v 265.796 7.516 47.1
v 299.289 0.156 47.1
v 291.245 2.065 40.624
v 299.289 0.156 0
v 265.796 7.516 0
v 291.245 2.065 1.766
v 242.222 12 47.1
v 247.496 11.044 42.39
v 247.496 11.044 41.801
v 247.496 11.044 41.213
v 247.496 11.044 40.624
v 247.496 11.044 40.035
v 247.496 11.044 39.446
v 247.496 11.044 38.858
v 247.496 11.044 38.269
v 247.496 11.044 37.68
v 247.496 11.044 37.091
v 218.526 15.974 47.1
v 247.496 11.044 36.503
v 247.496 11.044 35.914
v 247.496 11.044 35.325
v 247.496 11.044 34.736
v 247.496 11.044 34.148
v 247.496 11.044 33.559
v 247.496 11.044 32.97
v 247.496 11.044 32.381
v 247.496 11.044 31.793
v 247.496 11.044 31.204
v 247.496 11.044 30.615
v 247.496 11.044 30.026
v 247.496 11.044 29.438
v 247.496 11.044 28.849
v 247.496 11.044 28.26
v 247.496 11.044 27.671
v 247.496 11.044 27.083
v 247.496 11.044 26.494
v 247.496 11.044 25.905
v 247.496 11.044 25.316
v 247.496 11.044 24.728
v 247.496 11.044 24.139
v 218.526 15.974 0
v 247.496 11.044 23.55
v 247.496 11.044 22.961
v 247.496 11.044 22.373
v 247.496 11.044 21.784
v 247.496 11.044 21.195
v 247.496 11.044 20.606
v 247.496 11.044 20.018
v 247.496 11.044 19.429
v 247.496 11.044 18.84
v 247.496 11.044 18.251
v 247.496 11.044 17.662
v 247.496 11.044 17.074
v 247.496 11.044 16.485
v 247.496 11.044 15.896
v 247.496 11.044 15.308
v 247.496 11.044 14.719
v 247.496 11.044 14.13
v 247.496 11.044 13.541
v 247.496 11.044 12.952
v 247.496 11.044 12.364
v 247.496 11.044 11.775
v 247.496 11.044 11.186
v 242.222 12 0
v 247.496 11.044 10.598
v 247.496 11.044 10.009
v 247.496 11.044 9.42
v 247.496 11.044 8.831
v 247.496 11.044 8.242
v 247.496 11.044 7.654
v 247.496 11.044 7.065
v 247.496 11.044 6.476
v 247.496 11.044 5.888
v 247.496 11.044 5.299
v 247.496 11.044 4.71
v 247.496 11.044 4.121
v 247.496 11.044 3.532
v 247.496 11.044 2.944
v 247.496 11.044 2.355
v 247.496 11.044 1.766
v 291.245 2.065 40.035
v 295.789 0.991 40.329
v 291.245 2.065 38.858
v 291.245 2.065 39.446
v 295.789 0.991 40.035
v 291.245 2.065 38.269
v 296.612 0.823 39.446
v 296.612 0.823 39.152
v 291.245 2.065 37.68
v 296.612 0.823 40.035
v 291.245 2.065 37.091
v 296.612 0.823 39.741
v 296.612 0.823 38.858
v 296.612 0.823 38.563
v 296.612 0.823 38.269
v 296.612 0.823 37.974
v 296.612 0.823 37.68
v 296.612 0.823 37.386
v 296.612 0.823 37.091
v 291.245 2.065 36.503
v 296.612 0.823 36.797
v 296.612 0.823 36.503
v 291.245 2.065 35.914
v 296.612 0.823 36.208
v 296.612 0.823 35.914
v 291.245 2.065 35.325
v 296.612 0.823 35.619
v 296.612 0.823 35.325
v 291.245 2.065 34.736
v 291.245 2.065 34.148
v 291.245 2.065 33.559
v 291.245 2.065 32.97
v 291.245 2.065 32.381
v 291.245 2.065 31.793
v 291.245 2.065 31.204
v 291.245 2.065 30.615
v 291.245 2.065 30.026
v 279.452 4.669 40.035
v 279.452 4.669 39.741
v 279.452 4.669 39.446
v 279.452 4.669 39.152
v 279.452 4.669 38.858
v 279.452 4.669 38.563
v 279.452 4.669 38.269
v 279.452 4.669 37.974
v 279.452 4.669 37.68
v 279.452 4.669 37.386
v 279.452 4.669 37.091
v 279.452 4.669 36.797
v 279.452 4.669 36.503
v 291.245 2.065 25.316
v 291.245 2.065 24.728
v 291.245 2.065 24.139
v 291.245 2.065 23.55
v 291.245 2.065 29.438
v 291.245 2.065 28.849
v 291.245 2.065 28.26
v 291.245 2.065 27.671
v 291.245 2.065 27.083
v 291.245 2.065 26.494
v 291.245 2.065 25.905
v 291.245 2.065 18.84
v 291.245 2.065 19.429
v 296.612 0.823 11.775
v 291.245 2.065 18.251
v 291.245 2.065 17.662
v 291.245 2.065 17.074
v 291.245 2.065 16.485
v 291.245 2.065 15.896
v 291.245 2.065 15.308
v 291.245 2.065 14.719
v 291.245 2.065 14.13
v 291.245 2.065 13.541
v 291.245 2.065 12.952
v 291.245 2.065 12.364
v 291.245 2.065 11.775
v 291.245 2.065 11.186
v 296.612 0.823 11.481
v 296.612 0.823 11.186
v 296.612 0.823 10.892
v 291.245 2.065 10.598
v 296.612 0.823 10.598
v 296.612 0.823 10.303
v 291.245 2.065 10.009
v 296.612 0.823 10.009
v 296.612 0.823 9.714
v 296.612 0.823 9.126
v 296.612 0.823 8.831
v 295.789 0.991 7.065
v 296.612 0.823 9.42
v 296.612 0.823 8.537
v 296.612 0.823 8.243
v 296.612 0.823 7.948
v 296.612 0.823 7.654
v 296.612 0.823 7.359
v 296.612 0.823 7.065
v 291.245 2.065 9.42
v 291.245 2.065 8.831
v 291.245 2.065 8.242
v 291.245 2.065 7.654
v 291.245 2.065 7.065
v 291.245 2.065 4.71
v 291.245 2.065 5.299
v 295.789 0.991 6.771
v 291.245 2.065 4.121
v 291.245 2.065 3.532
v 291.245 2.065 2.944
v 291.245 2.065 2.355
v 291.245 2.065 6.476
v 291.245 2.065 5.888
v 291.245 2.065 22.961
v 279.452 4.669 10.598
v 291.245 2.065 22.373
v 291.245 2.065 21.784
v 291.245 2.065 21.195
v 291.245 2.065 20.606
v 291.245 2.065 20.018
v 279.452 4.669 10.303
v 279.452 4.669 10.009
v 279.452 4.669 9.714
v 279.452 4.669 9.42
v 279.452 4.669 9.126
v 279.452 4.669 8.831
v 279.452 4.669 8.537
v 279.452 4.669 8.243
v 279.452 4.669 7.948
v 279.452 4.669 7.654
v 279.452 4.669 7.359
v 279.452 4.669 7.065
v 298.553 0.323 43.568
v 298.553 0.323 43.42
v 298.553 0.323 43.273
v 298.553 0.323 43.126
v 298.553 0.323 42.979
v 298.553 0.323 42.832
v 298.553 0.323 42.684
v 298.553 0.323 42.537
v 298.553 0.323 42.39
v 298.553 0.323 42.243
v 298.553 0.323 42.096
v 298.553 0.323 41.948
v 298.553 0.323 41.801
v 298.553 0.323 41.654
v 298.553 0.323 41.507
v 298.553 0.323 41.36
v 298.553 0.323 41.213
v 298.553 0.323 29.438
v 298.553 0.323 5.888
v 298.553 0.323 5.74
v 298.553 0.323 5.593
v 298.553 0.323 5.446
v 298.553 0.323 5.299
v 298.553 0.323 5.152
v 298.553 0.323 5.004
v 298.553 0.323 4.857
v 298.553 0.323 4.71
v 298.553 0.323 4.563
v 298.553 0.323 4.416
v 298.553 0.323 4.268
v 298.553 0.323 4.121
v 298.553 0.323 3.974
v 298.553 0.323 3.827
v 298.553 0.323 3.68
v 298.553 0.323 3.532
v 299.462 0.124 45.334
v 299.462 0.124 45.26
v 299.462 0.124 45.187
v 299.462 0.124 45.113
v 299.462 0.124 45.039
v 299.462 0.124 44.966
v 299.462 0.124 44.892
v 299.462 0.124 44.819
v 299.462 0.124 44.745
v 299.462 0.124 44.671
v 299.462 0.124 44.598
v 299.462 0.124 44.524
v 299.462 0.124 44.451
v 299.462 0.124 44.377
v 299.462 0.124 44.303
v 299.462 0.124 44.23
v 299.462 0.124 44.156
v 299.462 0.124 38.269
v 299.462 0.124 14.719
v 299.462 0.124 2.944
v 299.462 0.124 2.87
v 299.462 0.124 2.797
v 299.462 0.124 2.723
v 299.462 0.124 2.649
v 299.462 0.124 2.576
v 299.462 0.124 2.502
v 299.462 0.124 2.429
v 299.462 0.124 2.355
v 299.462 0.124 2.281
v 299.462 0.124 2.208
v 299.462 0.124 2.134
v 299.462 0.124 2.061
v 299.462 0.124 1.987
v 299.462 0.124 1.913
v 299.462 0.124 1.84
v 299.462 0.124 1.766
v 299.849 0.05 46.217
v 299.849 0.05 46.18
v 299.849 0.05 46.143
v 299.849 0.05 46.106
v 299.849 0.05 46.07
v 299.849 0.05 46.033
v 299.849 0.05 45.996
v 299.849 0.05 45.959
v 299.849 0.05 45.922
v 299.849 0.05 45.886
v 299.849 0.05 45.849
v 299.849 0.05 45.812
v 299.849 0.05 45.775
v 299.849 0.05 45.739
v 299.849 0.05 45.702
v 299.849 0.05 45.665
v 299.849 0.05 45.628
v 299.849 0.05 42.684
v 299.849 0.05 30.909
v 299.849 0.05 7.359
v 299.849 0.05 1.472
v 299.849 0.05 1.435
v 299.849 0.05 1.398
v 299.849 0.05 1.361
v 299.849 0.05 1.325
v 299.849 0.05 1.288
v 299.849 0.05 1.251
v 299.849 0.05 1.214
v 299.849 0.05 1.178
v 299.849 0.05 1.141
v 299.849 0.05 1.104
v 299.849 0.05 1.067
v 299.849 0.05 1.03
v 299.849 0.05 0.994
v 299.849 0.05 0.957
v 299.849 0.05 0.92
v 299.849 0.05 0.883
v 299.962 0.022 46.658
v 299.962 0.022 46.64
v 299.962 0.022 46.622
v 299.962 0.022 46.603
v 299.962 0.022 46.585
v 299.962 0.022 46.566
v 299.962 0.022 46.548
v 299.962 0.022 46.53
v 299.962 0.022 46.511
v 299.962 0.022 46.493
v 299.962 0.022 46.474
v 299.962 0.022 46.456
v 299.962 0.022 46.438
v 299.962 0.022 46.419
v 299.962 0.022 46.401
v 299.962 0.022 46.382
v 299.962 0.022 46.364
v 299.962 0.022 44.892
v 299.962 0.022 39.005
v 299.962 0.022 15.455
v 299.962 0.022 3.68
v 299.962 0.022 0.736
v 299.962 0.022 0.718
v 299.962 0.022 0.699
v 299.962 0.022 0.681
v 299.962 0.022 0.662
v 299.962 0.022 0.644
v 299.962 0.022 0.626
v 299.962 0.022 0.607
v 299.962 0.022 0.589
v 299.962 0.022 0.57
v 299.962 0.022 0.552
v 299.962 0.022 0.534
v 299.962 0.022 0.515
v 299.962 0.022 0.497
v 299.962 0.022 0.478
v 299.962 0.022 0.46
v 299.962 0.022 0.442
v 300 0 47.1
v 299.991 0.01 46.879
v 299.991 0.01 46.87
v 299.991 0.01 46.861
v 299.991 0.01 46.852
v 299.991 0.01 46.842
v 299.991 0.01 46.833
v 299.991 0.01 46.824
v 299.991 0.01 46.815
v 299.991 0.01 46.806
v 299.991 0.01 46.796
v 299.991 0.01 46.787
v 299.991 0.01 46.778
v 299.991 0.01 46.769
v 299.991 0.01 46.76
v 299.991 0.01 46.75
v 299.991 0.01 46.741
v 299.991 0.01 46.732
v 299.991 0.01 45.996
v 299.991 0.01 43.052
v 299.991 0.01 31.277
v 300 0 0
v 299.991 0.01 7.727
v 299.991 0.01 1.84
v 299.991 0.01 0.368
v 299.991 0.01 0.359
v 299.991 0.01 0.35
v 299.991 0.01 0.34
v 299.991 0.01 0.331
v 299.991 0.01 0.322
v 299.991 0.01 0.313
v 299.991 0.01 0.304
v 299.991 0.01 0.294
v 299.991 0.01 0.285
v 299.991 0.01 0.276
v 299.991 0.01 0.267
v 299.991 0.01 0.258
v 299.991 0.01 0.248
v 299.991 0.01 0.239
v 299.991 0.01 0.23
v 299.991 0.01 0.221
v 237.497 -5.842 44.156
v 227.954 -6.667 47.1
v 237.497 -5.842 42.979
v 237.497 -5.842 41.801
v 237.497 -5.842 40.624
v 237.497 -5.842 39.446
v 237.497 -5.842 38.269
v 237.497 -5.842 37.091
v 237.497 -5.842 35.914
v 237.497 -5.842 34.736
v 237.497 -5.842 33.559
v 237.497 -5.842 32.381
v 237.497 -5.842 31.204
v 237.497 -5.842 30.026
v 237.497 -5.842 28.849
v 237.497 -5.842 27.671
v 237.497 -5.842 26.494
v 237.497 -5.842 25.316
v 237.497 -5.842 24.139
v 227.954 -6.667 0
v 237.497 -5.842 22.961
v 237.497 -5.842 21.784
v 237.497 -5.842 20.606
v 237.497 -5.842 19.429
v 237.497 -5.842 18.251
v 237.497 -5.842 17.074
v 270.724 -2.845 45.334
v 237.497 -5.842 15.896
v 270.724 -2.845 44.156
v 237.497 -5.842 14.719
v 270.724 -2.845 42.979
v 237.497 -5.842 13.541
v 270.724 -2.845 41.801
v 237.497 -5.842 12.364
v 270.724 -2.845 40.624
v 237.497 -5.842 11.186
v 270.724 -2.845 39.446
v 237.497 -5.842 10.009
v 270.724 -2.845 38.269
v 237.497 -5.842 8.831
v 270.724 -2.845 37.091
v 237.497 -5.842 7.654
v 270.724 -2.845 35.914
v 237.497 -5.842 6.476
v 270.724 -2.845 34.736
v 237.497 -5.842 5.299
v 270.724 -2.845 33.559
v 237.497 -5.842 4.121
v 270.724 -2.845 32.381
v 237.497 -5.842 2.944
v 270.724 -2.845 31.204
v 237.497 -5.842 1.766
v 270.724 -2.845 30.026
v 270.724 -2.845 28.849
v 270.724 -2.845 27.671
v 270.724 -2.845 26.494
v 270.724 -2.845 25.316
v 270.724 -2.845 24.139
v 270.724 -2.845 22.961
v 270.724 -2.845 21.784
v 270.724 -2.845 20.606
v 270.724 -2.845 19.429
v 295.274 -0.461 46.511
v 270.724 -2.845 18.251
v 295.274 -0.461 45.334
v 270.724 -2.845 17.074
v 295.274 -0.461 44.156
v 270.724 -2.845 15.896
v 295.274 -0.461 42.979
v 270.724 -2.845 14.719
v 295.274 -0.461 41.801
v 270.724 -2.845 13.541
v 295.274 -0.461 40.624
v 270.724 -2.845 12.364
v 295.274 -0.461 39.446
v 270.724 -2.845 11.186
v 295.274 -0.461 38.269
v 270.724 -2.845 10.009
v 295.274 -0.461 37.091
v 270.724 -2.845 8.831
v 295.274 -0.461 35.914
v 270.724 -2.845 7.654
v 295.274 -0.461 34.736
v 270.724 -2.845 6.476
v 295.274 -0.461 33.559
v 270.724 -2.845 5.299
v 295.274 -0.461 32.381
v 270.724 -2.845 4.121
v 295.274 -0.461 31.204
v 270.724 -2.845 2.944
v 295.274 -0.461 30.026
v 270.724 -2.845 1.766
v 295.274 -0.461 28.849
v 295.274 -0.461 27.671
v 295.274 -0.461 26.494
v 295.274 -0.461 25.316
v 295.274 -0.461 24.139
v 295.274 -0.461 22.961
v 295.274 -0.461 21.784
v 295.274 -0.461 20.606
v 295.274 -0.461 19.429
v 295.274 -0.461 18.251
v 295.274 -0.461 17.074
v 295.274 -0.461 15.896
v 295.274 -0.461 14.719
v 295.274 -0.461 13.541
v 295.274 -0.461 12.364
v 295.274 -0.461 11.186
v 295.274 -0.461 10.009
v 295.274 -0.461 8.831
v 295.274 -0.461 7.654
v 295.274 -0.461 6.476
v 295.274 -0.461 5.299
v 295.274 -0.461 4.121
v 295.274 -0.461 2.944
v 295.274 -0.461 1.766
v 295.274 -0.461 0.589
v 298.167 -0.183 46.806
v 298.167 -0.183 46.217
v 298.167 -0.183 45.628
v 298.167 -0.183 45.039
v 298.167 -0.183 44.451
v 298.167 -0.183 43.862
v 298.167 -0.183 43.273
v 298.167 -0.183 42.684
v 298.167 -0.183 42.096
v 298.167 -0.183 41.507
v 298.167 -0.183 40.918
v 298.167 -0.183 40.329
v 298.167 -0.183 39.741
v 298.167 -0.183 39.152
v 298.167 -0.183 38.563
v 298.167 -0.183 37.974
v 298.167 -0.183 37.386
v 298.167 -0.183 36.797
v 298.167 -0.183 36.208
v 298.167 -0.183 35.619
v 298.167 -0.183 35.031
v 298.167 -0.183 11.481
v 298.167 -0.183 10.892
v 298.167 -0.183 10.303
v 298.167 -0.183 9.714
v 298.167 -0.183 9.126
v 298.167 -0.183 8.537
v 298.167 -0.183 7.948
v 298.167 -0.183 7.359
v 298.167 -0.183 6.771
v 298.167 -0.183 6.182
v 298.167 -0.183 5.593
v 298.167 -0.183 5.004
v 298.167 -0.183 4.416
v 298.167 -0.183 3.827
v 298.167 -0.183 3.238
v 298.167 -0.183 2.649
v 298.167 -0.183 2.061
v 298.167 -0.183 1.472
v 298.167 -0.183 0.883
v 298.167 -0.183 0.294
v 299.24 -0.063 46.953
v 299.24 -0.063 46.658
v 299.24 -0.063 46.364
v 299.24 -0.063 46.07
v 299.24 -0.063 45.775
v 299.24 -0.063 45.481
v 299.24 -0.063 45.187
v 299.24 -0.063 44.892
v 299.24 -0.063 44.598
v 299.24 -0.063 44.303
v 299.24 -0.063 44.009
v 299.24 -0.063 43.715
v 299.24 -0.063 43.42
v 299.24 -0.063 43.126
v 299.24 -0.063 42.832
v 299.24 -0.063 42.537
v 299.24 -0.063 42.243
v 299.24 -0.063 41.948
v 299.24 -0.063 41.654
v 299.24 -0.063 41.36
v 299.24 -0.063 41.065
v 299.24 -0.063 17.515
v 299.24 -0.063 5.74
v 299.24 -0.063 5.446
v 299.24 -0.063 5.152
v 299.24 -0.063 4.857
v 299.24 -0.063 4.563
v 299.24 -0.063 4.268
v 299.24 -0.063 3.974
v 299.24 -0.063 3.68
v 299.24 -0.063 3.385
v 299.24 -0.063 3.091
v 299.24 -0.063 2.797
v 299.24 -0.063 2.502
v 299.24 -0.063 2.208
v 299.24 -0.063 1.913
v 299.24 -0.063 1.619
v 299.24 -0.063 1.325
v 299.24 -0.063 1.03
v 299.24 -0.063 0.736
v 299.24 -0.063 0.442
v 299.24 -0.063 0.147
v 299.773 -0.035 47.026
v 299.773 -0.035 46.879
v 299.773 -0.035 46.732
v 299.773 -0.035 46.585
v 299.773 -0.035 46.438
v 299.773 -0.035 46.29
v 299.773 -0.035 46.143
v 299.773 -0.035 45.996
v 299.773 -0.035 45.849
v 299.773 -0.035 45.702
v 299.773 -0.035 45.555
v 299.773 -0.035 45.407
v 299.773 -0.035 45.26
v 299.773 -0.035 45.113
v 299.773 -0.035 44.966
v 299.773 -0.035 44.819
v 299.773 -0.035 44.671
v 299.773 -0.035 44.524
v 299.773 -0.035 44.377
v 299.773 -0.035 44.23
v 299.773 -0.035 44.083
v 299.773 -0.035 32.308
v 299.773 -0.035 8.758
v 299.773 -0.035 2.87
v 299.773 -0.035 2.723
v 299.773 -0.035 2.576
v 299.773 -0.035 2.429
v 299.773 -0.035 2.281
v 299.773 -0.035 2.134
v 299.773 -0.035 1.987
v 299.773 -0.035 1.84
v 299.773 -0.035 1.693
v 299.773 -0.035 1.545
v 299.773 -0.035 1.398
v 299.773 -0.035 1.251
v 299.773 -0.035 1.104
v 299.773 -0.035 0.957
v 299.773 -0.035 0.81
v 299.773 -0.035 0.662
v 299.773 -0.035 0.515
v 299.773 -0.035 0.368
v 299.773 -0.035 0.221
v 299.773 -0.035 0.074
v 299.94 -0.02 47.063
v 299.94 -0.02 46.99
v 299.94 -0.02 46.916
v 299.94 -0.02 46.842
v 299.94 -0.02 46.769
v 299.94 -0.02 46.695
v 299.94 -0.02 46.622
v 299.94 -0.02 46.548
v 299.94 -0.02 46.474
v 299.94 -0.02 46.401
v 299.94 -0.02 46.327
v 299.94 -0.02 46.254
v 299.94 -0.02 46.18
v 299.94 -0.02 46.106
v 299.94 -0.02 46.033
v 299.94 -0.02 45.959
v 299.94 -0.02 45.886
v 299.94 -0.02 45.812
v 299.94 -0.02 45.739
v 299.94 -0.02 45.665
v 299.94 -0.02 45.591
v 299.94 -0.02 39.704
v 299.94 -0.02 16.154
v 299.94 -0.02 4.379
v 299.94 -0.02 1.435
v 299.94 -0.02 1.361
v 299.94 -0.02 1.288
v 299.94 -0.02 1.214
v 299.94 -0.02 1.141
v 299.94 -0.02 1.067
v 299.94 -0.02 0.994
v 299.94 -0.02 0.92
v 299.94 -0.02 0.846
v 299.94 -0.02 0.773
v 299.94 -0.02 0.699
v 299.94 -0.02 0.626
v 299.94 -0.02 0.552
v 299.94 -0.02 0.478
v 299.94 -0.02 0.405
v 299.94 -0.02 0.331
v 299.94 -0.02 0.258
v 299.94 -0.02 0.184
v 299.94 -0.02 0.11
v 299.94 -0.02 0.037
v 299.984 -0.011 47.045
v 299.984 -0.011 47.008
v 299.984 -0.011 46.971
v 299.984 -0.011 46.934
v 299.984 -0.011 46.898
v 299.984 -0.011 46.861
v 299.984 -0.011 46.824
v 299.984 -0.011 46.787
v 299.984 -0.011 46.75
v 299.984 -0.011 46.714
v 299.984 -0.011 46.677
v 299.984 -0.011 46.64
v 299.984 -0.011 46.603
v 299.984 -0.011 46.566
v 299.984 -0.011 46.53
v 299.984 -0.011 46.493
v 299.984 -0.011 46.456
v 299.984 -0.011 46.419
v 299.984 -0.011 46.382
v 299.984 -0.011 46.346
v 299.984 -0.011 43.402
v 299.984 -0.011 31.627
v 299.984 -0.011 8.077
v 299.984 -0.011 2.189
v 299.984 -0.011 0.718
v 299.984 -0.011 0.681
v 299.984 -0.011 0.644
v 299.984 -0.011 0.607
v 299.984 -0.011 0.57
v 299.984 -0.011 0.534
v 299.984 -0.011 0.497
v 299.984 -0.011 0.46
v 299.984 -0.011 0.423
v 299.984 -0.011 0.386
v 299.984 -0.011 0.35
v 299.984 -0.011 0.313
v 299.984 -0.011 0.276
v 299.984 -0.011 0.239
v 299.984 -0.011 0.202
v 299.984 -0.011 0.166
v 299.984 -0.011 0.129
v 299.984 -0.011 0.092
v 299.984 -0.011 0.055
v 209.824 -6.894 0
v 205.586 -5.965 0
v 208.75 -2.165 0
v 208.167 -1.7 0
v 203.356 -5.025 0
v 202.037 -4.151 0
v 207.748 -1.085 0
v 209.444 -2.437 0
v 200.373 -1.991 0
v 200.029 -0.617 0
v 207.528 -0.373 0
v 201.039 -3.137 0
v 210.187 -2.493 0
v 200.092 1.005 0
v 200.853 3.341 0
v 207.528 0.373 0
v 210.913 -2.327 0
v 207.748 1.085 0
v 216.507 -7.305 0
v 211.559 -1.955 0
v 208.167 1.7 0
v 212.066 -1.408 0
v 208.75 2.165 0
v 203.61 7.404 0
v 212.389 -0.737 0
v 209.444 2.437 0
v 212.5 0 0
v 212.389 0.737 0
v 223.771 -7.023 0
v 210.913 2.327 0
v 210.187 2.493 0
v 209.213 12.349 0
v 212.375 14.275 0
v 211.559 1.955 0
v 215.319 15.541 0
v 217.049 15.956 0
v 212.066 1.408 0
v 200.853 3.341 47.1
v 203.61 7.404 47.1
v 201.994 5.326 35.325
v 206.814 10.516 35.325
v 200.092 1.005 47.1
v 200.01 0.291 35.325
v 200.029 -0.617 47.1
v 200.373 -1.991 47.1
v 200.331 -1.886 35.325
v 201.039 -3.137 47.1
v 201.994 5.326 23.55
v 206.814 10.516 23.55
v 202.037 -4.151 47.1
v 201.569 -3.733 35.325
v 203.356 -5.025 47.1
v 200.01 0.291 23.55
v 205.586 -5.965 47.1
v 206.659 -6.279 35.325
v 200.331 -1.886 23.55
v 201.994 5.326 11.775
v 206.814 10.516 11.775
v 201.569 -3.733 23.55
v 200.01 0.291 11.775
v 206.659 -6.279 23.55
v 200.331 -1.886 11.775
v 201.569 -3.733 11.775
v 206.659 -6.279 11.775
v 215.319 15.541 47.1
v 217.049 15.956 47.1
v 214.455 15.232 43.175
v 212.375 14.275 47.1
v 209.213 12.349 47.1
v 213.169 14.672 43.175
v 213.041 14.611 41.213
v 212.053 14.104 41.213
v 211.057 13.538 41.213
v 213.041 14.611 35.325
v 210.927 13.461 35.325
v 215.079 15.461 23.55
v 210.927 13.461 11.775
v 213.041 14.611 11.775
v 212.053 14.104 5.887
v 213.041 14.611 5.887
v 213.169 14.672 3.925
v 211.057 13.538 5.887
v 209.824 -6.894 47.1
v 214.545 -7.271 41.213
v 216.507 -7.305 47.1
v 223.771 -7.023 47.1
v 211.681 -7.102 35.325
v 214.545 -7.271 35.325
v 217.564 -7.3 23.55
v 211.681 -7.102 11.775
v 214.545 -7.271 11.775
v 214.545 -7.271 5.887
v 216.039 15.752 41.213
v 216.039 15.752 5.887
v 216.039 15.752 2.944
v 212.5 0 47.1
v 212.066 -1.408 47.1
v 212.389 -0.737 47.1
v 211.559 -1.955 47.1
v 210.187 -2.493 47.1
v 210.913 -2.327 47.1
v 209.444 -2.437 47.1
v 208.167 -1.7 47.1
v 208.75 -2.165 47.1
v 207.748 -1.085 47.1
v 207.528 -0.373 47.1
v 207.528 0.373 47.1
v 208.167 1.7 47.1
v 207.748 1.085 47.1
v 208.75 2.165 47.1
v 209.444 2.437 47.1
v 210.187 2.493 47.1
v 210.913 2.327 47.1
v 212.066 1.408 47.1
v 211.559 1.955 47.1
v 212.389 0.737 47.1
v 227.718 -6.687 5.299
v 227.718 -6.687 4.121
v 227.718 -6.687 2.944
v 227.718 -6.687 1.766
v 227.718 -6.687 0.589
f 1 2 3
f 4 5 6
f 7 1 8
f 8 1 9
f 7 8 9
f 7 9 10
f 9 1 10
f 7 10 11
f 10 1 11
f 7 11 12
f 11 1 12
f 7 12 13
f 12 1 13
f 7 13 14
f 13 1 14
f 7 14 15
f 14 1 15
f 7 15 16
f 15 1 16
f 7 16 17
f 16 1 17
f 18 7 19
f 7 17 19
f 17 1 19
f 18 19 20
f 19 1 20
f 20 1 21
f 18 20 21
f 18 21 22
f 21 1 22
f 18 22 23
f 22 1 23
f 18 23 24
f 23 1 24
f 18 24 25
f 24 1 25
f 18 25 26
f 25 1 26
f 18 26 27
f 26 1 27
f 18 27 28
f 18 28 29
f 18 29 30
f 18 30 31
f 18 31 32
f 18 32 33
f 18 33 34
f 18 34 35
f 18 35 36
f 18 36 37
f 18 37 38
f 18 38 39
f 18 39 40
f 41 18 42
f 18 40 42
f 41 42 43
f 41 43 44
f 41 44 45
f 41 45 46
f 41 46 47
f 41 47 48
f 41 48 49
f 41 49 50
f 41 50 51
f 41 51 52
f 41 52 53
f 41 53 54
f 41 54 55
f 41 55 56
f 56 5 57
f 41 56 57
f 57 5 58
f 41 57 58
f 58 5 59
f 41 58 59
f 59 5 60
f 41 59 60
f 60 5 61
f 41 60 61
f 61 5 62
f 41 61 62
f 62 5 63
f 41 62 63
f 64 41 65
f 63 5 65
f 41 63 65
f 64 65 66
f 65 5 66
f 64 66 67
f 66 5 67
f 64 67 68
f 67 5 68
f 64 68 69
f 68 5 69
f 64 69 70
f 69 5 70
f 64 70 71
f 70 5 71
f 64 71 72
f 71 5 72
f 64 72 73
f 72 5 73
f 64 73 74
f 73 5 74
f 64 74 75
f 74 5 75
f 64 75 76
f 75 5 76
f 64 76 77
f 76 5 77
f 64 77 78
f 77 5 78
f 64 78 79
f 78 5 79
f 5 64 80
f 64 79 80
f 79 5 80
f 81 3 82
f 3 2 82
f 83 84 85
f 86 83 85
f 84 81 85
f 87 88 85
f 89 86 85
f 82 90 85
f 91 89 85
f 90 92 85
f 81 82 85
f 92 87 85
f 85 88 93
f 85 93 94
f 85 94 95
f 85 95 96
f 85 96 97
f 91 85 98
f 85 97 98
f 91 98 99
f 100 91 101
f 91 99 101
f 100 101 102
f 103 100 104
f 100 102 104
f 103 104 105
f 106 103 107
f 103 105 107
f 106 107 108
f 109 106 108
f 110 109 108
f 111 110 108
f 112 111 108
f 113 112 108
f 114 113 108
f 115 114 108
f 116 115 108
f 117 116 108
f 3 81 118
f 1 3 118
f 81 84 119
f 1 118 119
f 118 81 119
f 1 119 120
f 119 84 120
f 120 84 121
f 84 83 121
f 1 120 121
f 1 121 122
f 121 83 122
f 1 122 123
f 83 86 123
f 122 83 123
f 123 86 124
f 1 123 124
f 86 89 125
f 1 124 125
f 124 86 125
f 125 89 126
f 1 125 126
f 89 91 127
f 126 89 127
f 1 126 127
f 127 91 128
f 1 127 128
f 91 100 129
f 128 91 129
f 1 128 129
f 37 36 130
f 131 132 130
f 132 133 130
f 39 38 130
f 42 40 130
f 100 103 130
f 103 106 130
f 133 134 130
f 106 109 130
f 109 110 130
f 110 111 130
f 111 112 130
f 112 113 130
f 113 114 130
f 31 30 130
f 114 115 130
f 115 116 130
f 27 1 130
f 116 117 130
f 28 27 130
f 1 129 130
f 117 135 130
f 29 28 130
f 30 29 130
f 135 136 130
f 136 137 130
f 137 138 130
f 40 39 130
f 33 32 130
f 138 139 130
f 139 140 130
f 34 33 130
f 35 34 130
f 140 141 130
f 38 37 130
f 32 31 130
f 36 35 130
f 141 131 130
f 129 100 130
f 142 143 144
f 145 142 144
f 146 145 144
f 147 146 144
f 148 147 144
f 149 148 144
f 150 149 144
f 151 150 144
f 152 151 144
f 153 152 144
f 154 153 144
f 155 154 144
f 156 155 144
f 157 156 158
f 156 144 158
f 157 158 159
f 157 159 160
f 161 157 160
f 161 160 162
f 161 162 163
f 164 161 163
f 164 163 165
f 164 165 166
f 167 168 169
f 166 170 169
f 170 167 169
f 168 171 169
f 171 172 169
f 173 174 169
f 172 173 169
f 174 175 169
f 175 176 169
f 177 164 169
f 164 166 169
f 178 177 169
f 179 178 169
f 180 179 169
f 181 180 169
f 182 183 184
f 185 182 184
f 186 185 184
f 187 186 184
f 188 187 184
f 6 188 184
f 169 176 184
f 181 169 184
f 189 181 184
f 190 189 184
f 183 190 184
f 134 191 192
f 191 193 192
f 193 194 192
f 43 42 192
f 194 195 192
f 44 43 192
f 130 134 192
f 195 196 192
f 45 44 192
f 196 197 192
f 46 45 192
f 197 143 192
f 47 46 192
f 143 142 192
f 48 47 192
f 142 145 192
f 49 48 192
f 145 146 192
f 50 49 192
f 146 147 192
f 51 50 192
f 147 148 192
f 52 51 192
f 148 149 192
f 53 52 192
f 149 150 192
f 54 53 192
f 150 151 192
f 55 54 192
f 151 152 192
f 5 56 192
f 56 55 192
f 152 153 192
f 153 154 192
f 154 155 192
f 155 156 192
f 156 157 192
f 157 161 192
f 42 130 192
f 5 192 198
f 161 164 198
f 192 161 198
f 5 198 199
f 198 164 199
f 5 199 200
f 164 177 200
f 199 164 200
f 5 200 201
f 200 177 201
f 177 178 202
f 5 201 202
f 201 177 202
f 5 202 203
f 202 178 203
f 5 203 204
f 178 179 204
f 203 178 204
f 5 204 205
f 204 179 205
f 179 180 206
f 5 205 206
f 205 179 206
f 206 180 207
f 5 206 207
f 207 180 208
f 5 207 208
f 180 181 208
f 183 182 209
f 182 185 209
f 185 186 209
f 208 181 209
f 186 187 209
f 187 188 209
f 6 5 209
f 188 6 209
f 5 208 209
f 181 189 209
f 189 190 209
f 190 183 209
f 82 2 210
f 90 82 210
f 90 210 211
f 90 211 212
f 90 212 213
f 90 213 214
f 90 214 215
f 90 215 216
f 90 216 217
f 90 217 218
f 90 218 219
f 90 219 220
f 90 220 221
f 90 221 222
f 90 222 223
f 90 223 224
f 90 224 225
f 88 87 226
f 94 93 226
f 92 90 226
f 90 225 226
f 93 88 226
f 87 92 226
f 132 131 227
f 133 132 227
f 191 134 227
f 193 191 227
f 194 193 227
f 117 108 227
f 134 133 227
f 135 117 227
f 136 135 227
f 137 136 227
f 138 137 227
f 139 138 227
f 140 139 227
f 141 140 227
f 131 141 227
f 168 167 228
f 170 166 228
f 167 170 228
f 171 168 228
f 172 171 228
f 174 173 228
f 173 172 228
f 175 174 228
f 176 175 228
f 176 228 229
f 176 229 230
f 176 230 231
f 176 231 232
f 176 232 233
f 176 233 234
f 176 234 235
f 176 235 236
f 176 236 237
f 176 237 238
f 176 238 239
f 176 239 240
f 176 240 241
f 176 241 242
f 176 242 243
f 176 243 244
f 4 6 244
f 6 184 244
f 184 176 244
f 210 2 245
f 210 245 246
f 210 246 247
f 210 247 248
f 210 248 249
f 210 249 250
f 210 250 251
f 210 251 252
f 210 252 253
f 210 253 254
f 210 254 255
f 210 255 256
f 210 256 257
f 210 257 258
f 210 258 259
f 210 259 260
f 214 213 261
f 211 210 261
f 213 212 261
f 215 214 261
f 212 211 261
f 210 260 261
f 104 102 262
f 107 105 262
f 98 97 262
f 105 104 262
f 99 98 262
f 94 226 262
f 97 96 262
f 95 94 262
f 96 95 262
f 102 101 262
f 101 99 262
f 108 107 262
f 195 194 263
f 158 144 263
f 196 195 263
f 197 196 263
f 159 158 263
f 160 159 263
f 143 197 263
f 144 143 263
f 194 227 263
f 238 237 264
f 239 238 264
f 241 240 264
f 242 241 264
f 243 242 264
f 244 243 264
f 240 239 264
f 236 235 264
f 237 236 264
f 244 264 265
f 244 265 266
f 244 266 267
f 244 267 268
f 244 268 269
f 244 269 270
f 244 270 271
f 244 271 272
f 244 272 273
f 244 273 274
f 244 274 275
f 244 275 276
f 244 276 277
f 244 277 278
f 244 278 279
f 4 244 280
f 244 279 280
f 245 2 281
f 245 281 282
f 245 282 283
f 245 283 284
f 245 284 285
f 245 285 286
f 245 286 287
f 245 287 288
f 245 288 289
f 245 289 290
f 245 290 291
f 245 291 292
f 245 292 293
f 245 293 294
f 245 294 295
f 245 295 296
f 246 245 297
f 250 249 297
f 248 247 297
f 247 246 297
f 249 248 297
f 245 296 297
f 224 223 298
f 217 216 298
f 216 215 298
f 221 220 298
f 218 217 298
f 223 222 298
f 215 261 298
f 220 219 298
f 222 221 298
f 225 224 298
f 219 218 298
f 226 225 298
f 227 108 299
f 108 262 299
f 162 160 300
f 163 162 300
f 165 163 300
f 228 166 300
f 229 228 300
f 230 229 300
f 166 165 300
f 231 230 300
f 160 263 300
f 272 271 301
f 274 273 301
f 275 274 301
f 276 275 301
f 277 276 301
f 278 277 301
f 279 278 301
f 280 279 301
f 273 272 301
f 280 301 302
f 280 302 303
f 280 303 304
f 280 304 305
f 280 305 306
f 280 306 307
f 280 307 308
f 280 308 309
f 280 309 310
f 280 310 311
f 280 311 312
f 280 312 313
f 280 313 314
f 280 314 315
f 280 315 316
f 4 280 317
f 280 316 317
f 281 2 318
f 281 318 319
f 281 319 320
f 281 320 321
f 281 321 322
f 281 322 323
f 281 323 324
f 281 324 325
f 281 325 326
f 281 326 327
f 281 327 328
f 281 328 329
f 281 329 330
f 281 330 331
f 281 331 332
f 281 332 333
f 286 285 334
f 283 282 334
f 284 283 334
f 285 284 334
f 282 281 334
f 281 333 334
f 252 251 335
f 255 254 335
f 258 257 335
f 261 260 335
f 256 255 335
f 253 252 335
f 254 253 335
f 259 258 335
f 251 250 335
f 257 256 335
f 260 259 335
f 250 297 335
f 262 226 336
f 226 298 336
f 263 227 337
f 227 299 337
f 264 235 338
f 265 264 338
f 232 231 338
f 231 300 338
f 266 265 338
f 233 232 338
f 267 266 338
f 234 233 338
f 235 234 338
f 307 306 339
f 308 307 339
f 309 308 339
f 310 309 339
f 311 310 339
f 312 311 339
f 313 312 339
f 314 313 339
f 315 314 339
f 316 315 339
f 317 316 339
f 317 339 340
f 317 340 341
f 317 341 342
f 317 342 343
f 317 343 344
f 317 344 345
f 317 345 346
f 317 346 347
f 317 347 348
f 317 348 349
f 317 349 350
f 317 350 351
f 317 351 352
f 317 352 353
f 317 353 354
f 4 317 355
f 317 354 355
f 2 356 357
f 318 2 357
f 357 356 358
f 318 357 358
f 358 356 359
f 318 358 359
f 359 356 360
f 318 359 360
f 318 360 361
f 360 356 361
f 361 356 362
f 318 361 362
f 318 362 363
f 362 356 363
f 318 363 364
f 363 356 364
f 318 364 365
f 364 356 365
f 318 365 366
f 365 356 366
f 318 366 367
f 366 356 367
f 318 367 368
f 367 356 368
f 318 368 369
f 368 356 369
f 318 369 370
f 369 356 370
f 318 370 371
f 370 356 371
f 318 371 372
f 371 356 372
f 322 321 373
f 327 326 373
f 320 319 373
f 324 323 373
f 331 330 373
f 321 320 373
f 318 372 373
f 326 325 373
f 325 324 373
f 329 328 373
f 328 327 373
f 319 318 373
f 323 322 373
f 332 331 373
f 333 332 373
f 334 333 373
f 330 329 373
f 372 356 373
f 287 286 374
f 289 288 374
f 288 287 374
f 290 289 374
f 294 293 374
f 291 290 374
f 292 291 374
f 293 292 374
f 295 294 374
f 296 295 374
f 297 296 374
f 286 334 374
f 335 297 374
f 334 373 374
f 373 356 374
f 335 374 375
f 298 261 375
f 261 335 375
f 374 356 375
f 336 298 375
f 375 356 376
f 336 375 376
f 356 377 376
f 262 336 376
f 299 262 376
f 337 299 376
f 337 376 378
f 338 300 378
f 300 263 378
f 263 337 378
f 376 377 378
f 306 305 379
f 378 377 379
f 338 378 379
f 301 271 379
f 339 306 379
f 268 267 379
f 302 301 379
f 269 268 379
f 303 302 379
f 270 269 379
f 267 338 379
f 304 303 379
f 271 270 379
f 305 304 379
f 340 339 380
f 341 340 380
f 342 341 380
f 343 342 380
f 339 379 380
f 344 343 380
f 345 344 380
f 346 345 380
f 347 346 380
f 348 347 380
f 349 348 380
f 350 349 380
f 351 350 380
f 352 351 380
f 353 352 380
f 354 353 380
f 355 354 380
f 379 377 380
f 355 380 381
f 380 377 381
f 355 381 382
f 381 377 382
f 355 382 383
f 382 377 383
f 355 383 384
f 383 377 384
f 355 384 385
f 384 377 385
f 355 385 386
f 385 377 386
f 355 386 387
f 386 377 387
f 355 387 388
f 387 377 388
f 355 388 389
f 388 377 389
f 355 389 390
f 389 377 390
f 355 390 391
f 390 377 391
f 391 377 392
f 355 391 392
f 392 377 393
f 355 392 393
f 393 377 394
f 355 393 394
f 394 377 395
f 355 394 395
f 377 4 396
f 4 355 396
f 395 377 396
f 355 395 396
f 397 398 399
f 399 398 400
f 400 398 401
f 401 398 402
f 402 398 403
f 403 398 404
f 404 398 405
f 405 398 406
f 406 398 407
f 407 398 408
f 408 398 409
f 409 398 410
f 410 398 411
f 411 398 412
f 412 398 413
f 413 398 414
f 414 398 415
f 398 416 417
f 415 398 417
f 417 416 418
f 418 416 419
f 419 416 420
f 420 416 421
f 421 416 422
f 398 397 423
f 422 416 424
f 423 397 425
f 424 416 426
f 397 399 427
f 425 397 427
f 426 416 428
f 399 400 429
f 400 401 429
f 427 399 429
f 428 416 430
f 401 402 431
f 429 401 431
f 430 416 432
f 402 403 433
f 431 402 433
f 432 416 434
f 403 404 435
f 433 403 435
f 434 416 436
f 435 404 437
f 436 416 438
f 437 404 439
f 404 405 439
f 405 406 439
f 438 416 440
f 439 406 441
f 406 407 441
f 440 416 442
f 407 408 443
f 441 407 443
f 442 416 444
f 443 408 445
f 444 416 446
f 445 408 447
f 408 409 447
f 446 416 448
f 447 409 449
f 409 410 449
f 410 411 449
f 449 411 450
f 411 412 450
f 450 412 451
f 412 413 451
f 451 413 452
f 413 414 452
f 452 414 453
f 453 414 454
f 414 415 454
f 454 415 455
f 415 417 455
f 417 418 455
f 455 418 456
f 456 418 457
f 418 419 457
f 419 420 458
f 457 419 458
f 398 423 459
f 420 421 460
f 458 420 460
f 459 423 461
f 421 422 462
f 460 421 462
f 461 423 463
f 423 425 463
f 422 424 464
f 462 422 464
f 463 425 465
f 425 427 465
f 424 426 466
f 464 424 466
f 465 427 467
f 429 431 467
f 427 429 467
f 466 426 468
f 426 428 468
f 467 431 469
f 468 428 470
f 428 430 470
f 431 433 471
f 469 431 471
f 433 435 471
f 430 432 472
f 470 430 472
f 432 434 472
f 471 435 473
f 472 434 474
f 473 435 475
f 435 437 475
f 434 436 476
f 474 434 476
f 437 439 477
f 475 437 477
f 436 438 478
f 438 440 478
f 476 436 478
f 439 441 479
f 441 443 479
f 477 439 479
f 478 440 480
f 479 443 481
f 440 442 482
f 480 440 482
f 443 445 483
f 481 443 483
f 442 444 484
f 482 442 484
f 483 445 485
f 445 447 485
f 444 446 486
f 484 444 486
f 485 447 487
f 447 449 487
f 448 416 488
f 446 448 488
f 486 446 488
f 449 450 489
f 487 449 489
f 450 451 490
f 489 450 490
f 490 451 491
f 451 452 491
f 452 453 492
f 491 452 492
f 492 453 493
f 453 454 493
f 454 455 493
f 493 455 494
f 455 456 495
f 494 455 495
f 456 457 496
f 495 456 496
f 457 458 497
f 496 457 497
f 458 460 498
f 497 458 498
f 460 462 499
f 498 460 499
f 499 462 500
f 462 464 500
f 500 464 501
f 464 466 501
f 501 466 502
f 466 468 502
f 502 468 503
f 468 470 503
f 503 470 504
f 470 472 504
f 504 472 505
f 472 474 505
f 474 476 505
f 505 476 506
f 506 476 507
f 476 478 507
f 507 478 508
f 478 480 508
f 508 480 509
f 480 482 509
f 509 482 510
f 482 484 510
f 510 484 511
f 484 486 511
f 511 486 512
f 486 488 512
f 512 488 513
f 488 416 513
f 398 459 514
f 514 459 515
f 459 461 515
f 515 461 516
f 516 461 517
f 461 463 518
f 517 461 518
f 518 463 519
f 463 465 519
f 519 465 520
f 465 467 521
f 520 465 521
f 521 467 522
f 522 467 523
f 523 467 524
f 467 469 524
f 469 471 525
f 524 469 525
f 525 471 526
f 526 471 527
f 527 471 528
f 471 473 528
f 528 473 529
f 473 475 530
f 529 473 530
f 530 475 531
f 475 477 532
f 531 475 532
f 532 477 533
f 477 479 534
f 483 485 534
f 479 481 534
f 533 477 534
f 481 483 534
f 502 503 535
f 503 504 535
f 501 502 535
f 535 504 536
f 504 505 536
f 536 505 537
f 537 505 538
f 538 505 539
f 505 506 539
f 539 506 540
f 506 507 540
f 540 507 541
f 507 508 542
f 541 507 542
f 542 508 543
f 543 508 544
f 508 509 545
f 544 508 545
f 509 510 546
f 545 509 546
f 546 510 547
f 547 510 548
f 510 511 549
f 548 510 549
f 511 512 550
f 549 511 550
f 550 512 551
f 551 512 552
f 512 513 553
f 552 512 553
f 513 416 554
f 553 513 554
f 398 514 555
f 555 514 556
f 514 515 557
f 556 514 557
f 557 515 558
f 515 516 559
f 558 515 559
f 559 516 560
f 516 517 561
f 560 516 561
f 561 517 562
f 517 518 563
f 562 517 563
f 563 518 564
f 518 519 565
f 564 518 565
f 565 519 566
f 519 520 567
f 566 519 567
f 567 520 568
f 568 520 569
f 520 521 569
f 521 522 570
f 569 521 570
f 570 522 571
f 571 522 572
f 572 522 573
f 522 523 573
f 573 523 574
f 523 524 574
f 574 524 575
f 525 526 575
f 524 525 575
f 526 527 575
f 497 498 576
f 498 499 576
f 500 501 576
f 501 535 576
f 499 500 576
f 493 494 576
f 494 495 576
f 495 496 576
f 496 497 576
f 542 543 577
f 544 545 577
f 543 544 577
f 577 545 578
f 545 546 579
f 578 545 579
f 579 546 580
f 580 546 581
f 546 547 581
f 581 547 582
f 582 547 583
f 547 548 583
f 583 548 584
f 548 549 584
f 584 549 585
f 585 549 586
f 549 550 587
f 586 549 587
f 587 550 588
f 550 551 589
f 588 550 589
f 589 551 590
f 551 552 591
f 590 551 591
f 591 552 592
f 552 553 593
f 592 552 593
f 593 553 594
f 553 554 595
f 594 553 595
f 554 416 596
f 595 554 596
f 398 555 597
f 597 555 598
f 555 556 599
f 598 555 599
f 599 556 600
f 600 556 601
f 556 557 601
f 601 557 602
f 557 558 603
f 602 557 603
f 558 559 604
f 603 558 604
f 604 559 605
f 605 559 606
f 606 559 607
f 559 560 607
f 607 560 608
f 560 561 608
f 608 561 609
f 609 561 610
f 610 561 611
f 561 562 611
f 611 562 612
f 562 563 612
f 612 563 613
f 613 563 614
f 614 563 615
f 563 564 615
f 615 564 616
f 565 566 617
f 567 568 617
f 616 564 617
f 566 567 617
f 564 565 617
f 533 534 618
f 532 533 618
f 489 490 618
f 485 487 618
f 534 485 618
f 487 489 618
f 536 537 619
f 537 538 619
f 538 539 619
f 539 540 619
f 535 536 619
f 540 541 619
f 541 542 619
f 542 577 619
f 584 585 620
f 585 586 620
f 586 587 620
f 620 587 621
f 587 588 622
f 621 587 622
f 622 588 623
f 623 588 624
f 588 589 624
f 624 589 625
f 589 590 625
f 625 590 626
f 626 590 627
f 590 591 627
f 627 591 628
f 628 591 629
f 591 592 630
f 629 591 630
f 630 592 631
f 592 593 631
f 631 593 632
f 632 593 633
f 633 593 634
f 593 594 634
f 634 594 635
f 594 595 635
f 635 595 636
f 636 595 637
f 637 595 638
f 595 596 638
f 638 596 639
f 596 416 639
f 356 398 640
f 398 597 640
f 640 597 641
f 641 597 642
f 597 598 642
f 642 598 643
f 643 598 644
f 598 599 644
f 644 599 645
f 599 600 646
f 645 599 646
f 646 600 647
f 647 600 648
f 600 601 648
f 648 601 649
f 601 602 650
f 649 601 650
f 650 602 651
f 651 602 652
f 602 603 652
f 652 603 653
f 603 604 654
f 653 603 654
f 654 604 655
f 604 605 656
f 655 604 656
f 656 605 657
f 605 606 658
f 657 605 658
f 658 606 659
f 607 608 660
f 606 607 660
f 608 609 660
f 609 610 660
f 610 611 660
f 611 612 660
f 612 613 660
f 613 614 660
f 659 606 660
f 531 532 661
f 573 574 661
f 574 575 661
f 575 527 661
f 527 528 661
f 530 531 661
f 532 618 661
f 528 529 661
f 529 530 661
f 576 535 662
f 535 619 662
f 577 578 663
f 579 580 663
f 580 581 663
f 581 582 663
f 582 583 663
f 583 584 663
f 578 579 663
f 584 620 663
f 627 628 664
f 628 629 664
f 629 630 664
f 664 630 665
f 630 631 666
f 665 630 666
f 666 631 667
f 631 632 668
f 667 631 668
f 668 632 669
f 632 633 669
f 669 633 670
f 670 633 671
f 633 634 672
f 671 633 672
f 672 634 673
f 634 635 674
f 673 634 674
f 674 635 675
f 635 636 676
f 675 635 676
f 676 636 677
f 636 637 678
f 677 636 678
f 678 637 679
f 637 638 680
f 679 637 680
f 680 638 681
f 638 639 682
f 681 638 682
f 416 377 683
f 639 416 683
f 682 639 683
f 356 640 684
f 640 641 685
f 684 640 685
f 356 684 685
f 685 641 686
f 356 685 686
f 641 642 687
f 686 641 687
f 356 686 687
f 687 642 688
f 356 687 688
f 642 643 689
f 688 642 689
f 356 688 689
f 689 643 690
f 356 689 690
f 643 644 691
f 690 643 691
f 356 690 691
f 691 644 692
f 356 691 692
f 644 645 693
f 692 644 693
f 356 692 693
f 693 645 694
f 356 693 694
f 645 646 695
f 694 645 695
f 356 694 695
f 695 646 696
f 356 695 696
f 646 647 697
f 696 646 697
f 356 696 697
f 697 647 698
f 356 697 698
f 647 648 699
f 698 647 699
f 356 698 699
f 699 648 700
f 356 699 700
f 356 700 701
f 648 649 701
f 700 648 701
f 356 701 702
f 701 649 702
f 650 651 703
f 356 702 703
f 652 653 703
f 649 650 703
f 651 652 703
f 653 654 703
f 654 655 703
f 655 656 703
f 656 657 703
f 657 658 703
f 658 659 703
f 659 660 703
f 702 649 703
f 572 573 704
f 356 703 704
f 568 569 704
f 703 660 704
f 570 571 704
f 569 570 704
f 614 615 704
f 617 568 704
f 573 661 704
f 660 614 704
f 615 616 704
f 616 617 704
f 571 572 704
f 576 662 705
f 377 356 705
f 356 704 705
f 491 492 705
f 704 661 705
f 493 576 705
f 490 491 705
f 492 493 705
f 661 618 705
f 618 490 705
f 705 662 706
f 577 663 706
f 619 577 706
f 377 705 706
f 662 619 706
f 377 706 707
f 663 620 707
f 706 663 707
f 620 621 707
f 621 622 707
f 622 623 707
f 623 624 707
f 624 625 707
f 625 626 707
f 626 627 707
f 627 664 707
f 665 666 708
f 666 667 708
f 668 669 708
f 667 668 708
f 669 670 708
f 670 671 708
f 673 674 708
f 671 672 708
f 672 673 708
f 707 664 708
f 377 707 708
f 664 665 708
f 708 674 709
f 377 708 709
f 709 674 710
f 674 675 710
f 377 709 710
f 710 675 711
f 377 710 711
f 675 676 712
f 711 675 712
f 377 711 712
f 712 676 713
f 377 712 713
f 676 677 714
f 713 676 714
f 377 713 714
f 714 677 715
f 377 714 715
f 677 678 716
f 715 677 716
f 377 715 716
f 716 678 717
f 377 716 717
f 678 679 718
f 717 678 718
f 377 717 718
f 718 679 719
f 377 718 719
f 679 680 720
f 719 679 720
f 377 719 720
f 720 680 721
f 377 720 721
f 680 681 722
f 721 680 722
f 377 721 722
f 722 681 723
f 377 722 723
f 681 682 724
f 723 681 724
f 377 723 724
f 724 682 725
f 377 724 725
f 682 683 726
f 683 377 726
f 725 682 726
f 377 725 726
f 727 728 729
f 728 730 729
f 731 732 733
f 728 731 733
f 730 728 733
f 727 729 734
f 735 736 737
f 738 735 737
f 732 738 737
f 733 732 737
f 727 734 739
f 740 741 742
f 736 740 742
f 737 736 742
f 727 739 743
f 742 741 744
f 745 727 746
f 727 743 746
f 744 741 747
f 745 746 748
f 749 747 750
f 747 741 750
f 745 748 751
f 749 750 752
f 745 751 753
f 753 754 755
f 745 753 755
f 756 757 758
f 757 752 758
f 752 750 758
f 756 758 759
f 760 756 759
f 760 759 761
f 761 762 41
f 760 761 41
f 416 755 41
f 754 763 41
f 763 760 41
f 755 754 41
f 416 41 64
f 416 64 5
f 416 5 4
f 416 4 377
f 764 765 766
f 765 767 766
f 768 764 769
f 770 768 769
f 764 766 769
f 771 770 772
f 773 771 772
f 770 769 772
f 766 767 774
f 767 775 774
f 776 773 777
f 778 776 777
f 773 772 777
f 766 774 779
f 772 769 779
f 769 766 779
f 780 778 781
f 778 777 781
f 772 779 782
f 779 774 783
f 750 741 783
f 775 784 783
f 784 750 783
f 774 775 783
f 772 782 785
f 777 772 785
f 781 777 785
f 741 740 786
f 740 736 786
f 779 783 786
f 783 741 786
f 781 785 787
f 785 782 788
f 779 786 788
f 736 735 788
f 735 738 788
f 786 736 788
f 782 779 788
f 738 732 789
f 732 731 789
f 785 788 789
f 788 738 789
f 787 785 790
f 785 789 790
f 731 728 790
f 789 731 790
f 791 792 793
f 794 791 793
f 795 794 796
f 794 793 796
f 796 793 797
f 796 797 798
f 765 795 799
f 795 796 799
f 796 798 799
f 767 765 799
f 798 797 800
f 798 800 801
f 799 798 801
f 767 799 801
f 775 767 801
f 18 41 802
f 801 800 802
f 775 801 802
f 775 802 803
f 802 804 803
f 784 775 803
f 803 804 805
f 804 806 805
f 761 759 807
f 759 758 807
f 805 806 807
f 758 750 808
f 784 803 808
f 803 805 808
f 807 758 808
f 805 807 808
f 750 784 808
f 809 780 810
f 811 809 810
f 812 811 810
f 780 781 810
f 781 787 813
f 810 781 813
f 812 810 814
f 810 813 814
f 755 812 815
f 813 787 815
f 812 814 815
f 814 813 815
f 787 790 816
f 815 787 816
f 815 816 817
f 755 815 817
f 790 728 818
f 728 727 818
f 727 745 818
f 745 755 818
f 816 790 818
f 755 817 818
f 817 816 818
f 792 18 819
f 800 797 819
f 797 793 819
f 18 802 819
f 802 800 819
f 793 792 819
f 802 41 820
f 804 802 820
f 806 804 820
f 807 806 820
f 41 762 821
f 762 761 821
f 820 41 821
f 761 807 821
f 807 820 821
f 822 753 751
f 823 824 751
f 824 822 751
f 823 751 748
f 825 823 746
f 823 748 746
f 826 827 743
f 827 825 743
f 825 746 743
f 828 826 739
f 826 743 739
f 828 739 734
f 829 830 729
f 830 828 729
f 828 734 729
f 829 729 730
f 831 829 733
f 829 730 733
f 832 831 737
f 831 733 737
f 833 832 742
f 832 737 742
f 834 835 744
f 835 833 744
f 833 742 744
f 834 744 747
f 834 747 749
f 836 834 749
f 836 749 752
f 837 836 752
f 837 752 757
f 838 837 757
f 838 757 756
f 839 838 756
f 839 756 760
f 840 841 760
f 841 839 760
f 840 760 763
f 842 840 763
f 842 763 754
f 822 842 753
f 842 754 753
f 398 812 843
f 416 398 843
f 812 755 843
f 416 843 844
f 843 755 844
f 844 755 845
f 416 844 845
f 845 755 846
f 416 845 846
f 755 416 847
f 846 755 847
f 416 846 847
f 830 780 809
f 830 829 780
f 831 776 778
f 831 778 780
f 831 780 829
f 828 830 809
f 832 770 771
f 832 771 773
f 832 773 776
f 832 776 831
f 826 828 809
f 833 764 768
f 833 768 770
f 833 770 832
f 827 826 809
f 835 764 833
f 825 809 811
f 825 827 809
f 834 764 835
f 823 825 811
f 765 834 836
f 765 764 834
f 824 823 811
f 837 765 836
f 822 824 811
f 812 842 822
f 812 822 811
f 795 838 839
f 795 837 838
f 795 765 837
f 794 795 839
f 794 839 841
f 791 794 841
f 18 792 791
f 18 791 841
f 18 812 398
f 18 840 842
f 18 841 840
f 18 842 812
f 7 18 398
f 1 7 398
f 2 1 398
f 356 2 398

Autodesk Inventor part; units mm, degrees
ref_plane "YZ Plane" through (0, 0, 0) normal (1, 0, 0) x (0, 1, 0)
ref_plane "XZ Plane" through (0, 0, 0) normal (0, 1, 0) x (-1, 0, 0)
ref_plane "XY Plane" through (0, 0, 0) normal (0, 0, 1) x (1, 0, 0)
sketch "Sketch1" plane through (0, 0, 0) normal (0, 0, 1) x (1, 0, 0)
  spline S0 degree 5 poles (300, 0) (300.0016, 0.0244) (299.7036, 0.09) (298.2843, 0.2856) (298.1861, 0.6201) (294.2411, 1.1852) (292.5088, 1.8941) (287.5168, 2.8048) (283.3251, 3.8823) (277.2635, 5.114) (271.0288, 6.4738) (263.7046, 7.9415) (255.8588, 9.4927) (247.2609, 11.1039) (238.105, 12.7506) (228.3746, 14.4096) (218.1643, 16.0564) (207.5185, 17.6669) (196.5111, 19.219) (185.2054, 20.6879) (173.6732, 22.052) (161.9834, 23.2887) (150.21, 24.3752) (138.4162, 25.2964) (126.6928, 26.0196) (115.0744, 26.5602) (103.5988, 26.7997) (92.4288, 26.7578) (81.6023, 26.4231) (71.2108, 25.8005) (61.3178, 24.8978) (51.9933, 23.7307) (43.2967, 22.3175) (35.2844, 20.6817) (28.0043, 18.8519) (21.5007, 16.8582) (15.8056, 14.7303) (10.9426, 12.4987) (6.9231, 10.1816) (3.745, 7.791) (1.4298, 5.3026) (0.027, 2.7048) (-0.2762, -0.026) (0.5609, -2.6395) (2.4314, -4.909) (5.1526, -6.9052) (8.674, -8.6574) (12.9744, -10.2099) (18.0511, -11.5643) (23.8856, -12.7277) (30.4535, -13.6933) (37.7169, -14.4652) (45.6371, -15.0404) (54.1678, -15.428) (63.2602, -15.6353) (72.8628, -15.6753) (82.9246, -15.5641) (93.3855, -15.3196) (104.2036, -14.9665) (115.2834, -14.5145) (126.6481, -14.0171) (138.1928, -13.3887) (149.8108, -12.6841) (161.4481, -11.9059) (173.0242, -11.0809) (184.4692, -10.2189) (195.7125, -9.3406) (206.6821, -8.4534) (217.315, -7.5734) (227.5362, -6.706) (237.2988, -5.8637) (246.5067, -5.0508) (255.1715, -4.2808) (263.0989, -3.5455) (270.5088, -2.8843) (276.8391, -2.2398) (282.9867, -1.7375) (287.2724, -1.1764) (292.3303, -0.9034) (294.139, -0.4203) (298.1203, -0.3746) (298.262, -0.0558) (299.6943, -0.05) (299.9984, -0.0244) (300, 0) knots 0 0 0 0 0 0 0.005555 0.010406 0.017155 0.025351 0.034694 0.045016 0.056192 0.068127 0.080735 0.093944 0.107687 0.121902 0.13653 0.151515 0.166802 0.182339 0.198074 0.213956 0.229934 0.245959 0.261986 0.277975 0.293876 0.30964 0.325217 0.340551 0.355583 0.370262 0.384536 0.398352 0.411658 0.424397 0.436516 0.447959 0.458676 0.468629 0.477816 0.486311 0.494269 0.501928 0.509582 0.517526 0.525994 0.535136 0.54502 0.555644 0.566968 0.578942 0.591513 0.604627 0.618231 0.632275 0.64671 0.661487 0.676558 0.691886 0.707429 0.72314 0.738971 0.754875 0.770794 0.786673 0.802462 0.818112 0.833572 0.848791 0.863714 0.878289 0.892459 0.906165 0.919343 0.931928 0.943844 0.955007 0.965319 0.974656 0.982848 0.989595 0.994445 1 1 1 1 1 1
  line L0 (200, 103) -> (200, -97) construction
  line L1 (0, -164.4758) -> (0, 307.8549) construction
  line L2 (210, 0) -> (210, -12) construction
  line L3 (210, 0) -> (222, 0) construction
  spline S1 degree 4 poles (218.5257, 15.9738) (209.601, 17.344) (179.4452, -9.5392) (209.7943, -8.4144) (227.9538, -6.6666) knots 0 0 0 0 0 1 1 1 1 1
  line L4 (221.1774, 15.5667) -> (215.874, 16.3809) construction
  arc A0 (220.2542, 15.1852) -> (216.6402, 15.74) centre (217.9961, 12.5243) ccw construction
  line L5 (222.2571, -7.2149) -> (233.6505, -6.1183) construction
  arc A1 (223.3931, -7.0631) -> (232.5064, -6.186) centre (204.1762, 240.3791) ccw construction
  circle A2 centre (210, 0) radius 2.5
  point P0 (0, 0)
  point P1 (298.1739, 0.4338)
  point P2 (295.9008, 0.9681)
  point P3 (292.7367, 1.7025)
  point P4 (288.6996, 2.6229)
  point P5 (283.8129, 3.7134)
  point P6 (278.1048, 4.9545)
  point P7 (271.6086, 6.3255)
  point P8 (264.3621, 7.8039)
  point P9 (256.4085, 9.3663)
  point P10 (247.7946, 10.9887)
  point P11 (238.572, 12.6468)
  point P12 (228.7959, 14.3166)
  point P13 (207.8235, 17.5944)
  point P14 (196.755, 19.155)
  point P15 (185.388, 20.6319)
  point P16 (173.7924, 22.0023)
  point P17 (162.0405, 23.2434)
  point P18 (150.2055, 24.3336)
  point P19 (138.3615, 25.2522)
  point P20 (126.5832, 25.98)
  point P21 (114.8976, 26.493)
  point P22 (103.3635, 26.7315)
  point P23 (92.1183, 26.6775)
  point P24 (81.2367, 26.3292)
  point P25 (70.7922, 25.689)
  point P26 (60.8541, 24.7656)
  point P27 (51.489, 23.5734)
  point P28 (42.7587, 22.131)
  point P29 (34.7199, 20.4618)
  point P30 (27.4239, 18.5934)
  point P31 (20.9172, 16.5555)
  point P32 (15.2385, 14.379)
  point P33 (10.422, 12.0954)
  point P34 (6.4944, 9.7347)
  point P35 (3.4767, 7.3239)
  point P36 (1.3836, 4.8867)
  point P37 (0.2238, 2.4411)
  point P38 (0, 0)
  point P39 (0.7011, -2.3487)
  point P40 (2.31, -4.5201)
  point P41 (4.8123, -6.5094)
  point P42 (8.1885, -8.3112)
  point P43 (12.414, -9.9204)
  point P44 (17.4594, -11.3319)
  point P45 (23.2908, -12.5418)
  point P46 (29.871, -13.5477)
  point P47 (37.1583, -14.3505)
  point P48 (45.1092, -14.9526)
  point P49 (53.6766, -15.3609)
  point P50 (62.8101, -15.5853)
  point P51 (72.4581, -15.639)
  point P52 (82.566, -15.5385)
  point P53 (93.0768, -15.3033)
  point P54 (103.9314, -14.9544)
  point P55 (115.0689, -14.514)
  point P56 (126.4866, -13.9956)
  point P57 (138.1008, -13.3755)
  point P58 (149.7945, -12.6672)
  point P59 (161.4972, -11.8896)
  point P60 (173.1378, -11.061)
  point P61 (184.6455, -10.1973)
  point P62 (195.9501, -9.3141)
  point P63 (206.9814, -8.4237)
  point P64 (217.6716, -7.5381)
  point P65 (227.9538, -6.6666)
  point P66 (237.7638, -5.8185)
  point P67 (247.0398, -5.0019)
  point P68 (255.7236, -4.2234)
  point P69 (263.7597, -3.4905)
  point P70 (271.0965, -2.8098)
  point P71 (277.6872, -2.1882)
  point P72 (283.4889, -1.6323)
  point P73 (288.4641, -1.1487)
  point P74 (292.5804, -0.7434)
  point P75 (295.8102, -0.4221)
  point P76 (298.1328, -0.1887)
  point P77 (299.5323, -0.0474)
  point P78 (200, 0)
  point P79 (223.7705, -7.0234)
  dimension "d0" = 200
  dimension "d2" = 200
  dimension "d3" = 12
  dimension "d4" = 90
  dimension "d5" = 10
  dimension "d17" = 5
extrude "Extrusion2" add sketch "Sketch1" along normal blind 47.1 contours S0 S1 picked at (264.3061, 0.3433)
properties part number "4P.01.01.01-TW-v1-Flap Shape Definition" material "Polyurethane Foam"
